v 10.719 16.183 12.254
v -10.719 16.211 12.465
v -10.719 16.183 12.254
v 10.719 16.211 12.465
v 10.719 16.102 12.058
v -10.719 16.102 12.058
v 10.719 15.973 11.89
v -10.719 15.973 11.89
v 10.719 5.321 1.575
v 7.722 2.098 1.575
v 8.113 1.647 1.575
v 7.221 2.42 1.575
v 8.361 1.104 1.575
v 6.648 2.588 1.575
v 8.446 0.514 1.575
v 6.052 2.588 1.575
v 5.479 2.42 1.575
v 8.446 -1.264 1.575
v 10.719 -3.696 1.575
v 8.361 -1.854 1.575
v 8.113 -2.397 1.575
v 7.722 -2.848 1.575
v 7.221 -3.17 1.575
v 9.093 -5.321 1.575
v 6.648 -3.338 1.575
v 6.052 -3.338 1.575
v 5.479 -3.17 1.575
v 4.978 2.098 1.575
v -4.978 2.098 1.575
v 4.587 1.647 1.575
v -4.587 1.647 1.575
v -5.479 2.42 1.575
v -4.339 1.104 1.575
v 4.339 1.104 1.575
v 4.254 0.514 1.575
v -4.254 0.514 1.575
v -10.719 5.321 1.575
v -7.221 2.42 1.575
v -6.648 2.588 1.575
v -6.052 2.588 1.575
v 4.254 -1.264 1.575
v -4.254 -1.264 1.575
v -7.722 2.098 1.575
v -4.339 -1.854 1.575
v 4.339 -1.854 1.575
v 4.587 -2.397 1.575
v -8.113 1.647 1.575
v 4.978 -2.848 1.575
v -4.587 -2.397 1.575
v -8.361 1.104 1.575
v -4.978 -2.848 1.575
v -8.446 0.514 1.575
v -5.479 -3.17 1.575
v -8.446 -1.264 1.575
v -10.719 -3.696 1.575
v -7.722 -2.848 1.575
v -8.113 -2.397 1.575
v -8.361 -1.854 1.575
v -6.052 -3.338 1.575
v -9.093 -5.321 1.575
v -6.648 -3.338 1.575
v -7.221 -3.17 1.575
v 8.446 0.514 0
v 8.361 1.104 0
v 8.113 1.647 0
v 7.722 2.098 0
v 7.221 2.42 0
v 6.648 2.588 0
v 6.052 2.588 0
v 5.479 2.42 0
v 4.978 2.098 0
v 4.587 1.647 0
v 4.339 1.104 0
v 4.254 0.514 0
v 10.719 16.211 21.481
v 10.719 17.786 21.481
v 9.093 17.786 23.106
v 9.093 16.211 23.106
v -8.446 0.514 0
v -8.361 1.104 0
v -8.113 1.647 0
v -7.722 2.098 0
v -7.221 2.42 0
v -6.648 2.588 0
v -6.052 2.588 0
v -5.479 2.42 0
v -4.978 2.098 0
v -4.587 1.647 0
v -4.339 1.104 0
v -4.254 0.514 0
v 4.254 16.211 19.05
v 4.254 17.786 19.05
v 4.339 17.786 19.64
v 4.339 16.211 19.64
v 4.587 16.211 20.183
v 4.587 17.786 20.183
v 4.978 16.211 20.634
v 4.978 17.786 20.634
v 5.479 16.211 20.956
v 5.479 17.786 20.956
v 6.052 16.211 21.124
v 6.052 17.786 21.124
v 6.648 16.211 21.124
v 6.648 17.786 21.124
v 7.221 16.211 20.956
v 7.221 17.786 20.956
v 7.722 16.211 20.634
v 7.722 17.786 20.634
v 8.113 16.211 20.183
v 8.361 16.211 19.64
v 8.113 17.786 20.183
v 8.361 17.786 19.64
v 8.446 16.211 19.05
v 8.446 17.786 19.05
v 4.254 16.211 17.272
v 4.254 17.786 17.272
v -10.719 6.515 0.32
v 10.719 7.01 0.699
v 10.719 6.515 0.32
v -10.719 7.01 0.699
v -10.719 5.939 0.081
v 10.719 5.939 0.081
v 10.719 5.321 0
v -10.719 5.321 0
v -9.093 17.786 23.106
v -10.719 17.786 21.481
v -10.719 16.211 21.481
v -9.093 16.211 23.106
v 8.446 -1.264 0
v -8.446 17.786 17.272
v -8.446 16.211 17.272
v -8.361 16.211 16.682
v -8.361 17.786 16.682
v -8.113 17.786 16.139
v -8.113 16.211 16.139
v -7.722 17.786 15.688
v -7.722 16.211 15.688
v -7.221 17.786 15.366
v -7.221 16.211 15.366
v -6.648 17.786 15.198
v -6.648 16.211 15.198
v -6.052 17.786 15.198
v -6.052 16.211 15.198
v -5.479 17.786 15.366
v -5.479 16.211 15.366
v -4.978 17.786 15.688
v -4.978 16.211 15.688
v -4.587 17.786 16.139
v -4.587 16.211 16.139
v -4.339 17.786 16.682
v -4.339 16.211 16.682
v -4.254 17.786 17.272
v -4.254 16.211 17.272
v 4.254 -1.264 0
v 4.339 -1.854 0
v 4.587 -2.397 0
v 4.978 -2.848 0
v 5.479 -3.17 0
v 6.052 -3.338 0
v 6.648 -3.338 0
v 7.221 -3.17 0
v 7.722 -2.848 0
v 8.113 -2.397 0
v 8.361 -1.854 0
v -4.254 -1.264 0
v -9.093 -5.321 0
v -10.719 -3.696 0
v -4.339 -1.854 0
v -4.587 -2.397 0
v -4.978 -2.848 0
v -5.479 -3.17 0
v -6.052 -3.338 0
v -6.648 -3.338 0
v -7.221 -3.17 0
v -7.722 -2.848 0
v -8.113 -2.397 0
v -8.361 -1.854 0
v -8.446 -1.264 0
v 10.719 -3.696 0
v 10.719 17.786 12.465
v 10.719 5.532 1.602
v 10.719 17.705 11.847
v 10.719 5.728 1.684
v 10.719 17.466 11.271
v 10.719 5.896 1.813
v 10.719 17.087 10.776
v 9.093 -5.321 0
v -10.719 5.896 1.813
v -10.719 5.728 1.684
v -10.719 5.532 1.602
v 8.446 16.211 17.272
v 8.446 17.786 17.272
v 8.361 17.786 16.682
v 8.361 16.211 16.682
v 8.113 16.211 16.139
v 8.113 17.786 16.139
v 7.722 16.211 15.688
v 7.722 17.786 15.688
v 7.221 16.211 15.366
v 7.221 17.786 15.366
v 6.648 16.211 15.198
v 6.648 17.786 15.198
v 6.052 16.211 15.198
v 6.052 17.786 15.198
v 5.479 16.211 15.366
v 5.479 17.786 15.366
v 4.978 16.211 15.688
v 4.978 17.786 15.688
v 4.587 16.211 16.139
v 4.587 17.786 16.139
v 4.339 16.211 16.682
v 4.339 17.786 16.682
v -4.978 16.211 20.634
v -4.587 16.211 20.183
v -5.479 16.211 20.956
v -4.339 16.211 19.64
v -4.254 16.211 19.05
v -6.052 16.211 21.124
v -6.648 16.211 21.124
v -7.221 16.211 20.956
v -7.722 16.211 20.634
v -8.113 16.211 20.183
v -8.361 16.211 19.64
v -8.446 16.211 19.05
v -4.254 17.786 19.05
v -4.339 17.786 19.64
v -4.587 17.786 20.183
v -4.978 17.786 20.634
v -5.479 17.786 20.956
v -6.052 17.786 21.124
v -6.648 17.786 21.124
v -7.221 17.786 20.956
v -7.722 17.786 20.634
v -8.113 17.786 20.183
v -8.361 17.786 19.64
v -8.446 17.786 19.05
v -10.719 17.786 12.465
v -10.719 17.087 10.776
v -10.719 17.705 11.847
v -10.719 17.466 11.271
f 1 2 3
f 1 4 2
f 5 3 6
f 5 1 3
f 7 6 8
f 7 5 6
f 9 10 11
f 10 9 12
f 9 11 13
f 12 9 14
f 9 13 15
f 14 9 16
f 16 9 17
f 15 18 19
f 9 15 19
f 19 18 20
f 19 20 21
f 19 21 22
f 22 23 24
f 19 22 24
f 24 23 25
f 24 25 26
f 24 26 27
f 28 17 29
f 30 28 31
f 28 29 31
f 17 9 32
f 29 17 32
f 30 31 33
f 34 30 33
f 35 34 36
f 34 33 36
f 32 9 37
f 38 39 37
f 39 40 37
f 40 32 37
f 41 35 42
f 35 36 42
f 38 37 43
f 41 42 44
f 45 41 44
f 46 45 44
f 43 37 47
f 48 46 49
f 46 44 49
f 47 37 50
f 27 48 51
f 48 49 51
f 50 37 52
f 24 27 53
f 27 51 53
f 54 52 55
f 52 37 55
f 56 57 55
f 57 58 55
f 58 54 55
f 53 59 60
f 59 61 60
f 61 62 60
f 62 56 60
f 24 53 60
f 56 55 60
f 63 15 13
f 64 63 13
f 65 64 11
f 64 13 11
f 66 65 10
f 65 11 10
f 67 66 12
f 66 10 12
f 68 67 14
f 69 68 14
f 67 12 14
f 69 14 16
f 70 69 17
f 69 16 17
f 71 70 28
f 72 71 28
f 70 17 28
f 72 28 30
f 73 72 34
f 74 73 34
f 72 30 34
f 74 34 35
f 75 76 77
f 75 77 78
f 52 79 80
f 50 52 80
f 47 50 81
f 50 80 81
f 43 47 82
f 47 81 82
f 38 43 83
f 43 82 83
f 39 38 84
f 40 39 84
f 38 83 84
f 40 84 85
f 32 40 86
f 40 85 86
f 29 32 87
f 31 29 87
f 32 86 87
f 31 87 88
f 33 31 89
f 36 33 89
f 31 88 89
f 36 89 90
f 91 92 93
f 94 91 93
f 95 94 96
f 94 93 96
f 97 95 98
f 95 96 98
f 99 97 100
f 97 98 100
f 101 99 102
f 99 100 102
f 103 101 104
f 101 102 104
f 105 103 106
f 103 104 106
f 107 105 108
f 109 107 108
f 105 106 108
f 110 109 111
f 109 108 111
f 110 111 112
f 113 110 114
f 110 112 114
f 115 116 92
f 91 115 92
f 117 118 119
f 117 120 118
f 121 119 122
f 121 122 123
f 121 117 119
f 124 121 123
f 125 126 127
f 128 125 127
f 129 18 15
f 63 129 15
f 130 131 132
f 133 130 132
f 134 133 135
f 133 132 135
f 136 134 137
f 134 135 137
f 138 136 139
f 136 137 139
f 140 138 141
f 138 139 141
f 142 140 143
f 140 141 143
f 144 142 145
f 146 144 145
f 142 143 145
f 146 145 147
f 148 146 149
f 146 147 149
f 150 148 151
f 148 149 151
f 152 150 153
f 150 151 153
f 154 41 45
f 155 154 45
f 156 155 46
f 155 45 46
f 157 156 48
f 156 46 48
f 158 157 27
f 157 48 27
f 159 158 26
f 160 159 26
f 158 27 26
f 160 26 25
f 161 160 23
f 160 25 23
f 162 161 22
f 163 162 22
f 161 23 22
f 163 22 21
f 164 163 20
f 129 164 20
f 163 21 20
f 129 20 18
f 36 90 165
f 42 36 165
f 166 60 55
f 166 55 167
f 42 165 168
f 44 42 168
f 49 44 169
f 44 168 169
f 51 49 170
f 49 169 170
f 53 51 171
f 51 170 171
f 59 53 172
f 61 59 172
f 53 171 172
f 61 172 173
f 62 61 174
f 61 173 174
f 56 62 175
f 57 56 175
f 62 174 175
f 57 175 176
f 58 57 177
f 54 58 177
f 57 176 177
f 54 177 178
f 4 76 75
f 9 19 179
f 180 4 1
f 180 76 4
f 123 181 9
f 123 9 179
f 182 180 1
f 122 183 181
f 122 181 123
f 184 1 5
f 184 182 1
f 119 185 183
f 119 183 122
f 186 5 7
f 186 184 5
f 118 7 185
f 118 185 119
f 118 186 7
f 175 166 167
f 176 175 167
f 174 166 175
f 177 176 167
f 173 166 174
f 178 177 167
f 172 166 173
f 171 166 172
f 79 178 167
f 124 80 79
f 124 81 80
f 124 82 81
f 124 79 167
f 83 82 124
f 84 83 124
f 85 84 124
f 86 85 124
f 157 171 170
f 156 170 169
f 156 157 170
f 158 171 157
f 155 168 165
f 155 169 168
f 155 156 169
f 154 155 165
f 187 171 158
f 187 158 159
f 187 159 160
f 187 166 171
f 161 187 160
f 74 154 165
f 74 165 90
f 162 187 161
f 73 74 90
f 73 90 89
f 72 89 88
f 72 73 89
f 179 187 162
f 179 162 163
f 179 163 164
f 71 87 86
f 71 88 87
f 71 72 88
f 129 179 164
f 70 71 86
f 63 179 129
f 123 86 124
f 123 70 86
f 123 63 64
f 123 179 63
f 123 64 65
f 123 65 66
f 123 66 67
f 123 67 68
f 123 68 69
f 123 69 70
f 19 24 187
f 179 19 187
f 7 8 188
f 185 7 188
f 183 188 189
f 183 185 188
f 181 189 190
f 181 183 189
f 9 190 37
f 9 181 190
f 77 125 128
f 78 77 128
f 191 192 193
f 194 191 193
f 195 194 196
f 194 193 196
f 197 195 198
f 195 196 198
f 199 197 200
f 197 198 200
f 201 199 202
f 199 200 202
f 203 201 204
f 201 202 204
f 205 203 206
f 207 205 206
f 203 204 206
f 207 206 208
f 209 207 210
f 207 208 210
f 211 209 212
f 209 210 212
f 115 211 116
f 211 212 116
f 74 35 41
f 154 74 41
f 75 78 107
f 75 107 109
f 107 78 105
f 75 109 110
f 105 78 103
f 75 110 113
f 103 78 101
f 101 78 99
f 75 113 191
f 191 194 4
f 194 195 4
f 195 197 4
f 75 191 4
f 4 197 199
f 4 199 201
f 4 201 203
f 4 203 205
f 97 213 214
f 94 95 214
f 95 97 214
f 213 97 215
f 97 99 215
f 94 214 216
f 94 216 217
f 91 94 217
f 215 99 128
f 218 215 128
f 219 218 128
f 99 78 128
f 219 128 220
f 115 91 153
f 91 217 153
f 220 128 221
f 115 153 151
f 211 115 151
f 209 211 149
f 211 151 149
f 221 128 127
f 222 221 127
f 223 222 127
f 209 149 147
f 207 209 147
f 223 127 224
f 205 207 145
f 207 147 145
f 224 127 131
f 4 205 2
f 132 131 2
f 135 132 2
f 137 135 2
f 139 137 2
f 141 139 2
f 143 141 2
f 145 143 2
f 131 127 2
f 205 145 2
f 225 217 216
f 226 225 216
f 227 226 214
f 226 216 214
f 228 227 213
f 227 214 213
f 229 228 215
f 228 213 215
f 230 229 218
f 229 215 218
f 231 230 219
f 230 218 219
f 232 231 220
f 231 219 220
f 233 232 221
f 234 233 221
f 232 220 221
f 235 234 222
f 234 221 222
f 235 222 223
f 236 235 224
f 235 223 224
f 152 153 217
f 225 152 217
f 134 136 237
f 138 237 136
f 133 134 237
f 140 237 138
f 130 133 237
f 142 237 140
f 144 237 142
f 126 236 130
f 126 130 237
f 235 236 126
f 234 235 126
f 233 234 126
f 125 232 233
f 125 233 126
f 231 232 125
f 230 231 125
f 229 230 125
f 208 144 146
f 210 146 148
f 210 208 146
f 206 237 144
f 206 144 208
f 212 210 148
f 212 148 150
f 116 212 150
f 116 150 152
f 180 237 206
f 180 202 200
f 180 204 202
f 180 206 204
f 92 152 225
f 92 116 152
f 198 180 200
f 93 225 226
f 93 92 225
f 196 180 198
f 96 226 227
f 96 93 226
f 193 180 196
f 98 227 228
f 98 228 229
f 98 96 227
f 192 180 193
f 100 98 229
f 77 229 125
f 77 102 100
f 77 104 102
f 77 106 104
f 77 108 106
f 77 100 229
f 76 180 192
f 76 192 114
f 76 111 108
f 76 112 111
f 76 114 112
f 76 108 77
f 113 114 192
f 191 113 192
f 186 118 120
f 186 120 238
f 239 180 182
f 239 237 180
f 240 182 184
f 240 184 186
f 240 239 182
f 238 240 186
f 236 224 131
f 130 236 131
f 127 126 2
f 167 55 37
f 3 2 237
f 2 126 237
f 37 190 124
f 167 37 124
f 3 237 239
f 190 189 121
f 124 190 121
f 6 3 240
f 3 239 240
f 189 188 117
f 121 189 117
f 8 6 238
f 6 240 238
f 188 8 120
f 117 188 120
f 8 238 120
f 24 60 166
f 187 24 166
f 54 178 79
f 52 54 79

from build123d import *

# Parameters (mm, degrees)
BOSS_EXTRUDE1_DEPTH = 21.4376
CUT_EXTRUDE1_DEPTH  = 22.4376
CUT_EXTRUDE2_DEPTH  = 2.5748
CUT_EXTRUDE3_DEPTH  = 24.107195496
CUT_EXTRUDE4_DEPTH  = 2.5748
CUT_EXTRUDE5_DEPTH  = 24.106279195
CHAMFER1_SIZE       = 1.6256
FILLET1_R           = 0.8128
FILLET2_R           = 2.3876


with BuildPart() as part:
    # Sketch1 → Boss-Extrude1 (new body)
    with BuildSketch(Plane(origin=(10.7188, 0, 0), x_dir=(0, 0, -1), z_dir=(1, 0, 0))):
        Polygon((-23.106279195, 17.785895496), (-23.106279195, -5.3213), (0, -5.3213), (0, 6.310276302), (-11.475619195, 17.785895496), align=None)
    extrude(amount=-BOSS_EXTRUDE1_DEPTH)

    # Sketch2 → Cut-Extrude1 (cut, through all)
    with BuildSketch(Plane.ZY.offset(10.7188)):
        Polygon((23.106279195, -5.3213), (23.106279195, 16.211095496), (12.127922713, 16.211095496), (1.5748, 5.657972783), (1.5748, -5.3213), align=None)
    extrude(amount=-CUT_EXTRUDE1_DEPTH, mode=Mode.SUBTRACT)

    # Sketch3 → Cut-Extrude2 (cut, through all)
    with BuildSketch(Plane.XZ.offset(-16.211095496)):
        with BuildLine():
            Line((-4.2545, 17.272), (-4.2545, 19.05))
            ThreePointArc((-4.2545, 19.05), (-6.35, 21.1455), (-8.4455, 19.05))
            Line((-8.4455, 19.05), (-8.4455, 17.272))
            ThreePointArc((-8.4455, 17.272), (-6.35, 15.1765), (-4.2545, 17.272))
        make_face()
    extrude(amount=-CUT_EXTRUDE2_DEPTH, mode=Mode.SUBTRACT)

    # Sketch4 → Cut-Extrude3 (cut, through all)
    with BuildSketch(Plane(origin=(0, 17.785895496, 0), x_dir=(-1, 0, 0), z_dir=(0, 1, 0))):
        with BuildLine():
            Line((-8.4455, 19.05), (-8.4455, 17.272))
            ThreePointArc((-8.4455, 17.272), (-6.35, 15.1765), (-4.2545, 17.272))
            Line((-4.2545, 17.272), (-4.2545, 19.05))
            ThreePointArc((-4.2545, 19.05), (-6.35, 21.1455), (-8.4455, 19.05))
        make_face()
    extrude(amount=-CUT_EXTRUDE3_DEPTH, mode=Mode.SUBTRACT)

    # Sketch5 → Cut-Extrude4 (cut, through all)
    with BuildSketch(Plane.XY.offset(1.5748)):
        with BuildLine():
            Line((4.2545, 0.513895496), (4.2545, -1.264104504))
            ThreePointArc((4.2545, -1.264104504), (6.35, -3.359604504), (8.4455, -1.264104504))
            Line((8.4455, -1.264104504), (8.4455, 0.513895496))
            ThreePointArc((8.4455, 0.513895496), (6.35, 2.609395496), (4.2545, 0.513895496))
        make_face()
    extrude(amount=-CUT_EXTRUDE4_DEPTH, mode=Mode.SUBTRACT)

    # Sketch6 → Cut-Extrude5 (cut, through all)
    with BuildSketch(Plane(origin=(0, 0, 0), x_dir=(-1, 0, 0), z_dir=(0, 0, -1))):
        with BuildLine():
            Line((8.4455, -1.264104504), (8.4455, 0.513895496))
            ThreePointArc((8.4455, 0.513895496), (6.35, 2.609395496), (4.2545, 0.513895496))
            Line((4.2545, 0.513895496), (4.2545, -1.264104504))
            ThreePointArc((4.2545, -1.264104504), (6.35, -3.359604504), (8.4455, -1.264104504))
        make_face()
    extrude(amount=-CUT_EXTRUDE5_DEPTH, mode=Mode.SUBTRACT)

    # Chamfer1
    chamfer1_edges = [part.edges().sort_by_distance(p)[0] for p in [
        (10.7188, -5.3213, 0.7874),
        (-10.7188, -5.3213, 0.7874),
        (10.7188, 16.998495496, 23.106279195),
        (-10.7188, 16.998495496, 23.106279195),
    ]]
    chamfer(chamfer1_edges, length=CHAMFER1_SIZE)

    # Fillet1
    fillet1_edges = [part.edges().sort_by_distance(p)[0] for p in [
        (0, 5.657972783, 1.5748),
        (0, 16.211095496, 12.127922713),
    ]]
    fillet(fillet1_edges, radius=FILLET1_R)

    # Fillet2
    fillet2_edges = [part.edges().sort_by_distance(p)[0] for p in [
        (0, 17.785895496, 11.475619195),
        (0, 6.310276302, 0),
    ]]
    fillet(fillet2_edges, radius=FILLET2_R)


solid = part.part
